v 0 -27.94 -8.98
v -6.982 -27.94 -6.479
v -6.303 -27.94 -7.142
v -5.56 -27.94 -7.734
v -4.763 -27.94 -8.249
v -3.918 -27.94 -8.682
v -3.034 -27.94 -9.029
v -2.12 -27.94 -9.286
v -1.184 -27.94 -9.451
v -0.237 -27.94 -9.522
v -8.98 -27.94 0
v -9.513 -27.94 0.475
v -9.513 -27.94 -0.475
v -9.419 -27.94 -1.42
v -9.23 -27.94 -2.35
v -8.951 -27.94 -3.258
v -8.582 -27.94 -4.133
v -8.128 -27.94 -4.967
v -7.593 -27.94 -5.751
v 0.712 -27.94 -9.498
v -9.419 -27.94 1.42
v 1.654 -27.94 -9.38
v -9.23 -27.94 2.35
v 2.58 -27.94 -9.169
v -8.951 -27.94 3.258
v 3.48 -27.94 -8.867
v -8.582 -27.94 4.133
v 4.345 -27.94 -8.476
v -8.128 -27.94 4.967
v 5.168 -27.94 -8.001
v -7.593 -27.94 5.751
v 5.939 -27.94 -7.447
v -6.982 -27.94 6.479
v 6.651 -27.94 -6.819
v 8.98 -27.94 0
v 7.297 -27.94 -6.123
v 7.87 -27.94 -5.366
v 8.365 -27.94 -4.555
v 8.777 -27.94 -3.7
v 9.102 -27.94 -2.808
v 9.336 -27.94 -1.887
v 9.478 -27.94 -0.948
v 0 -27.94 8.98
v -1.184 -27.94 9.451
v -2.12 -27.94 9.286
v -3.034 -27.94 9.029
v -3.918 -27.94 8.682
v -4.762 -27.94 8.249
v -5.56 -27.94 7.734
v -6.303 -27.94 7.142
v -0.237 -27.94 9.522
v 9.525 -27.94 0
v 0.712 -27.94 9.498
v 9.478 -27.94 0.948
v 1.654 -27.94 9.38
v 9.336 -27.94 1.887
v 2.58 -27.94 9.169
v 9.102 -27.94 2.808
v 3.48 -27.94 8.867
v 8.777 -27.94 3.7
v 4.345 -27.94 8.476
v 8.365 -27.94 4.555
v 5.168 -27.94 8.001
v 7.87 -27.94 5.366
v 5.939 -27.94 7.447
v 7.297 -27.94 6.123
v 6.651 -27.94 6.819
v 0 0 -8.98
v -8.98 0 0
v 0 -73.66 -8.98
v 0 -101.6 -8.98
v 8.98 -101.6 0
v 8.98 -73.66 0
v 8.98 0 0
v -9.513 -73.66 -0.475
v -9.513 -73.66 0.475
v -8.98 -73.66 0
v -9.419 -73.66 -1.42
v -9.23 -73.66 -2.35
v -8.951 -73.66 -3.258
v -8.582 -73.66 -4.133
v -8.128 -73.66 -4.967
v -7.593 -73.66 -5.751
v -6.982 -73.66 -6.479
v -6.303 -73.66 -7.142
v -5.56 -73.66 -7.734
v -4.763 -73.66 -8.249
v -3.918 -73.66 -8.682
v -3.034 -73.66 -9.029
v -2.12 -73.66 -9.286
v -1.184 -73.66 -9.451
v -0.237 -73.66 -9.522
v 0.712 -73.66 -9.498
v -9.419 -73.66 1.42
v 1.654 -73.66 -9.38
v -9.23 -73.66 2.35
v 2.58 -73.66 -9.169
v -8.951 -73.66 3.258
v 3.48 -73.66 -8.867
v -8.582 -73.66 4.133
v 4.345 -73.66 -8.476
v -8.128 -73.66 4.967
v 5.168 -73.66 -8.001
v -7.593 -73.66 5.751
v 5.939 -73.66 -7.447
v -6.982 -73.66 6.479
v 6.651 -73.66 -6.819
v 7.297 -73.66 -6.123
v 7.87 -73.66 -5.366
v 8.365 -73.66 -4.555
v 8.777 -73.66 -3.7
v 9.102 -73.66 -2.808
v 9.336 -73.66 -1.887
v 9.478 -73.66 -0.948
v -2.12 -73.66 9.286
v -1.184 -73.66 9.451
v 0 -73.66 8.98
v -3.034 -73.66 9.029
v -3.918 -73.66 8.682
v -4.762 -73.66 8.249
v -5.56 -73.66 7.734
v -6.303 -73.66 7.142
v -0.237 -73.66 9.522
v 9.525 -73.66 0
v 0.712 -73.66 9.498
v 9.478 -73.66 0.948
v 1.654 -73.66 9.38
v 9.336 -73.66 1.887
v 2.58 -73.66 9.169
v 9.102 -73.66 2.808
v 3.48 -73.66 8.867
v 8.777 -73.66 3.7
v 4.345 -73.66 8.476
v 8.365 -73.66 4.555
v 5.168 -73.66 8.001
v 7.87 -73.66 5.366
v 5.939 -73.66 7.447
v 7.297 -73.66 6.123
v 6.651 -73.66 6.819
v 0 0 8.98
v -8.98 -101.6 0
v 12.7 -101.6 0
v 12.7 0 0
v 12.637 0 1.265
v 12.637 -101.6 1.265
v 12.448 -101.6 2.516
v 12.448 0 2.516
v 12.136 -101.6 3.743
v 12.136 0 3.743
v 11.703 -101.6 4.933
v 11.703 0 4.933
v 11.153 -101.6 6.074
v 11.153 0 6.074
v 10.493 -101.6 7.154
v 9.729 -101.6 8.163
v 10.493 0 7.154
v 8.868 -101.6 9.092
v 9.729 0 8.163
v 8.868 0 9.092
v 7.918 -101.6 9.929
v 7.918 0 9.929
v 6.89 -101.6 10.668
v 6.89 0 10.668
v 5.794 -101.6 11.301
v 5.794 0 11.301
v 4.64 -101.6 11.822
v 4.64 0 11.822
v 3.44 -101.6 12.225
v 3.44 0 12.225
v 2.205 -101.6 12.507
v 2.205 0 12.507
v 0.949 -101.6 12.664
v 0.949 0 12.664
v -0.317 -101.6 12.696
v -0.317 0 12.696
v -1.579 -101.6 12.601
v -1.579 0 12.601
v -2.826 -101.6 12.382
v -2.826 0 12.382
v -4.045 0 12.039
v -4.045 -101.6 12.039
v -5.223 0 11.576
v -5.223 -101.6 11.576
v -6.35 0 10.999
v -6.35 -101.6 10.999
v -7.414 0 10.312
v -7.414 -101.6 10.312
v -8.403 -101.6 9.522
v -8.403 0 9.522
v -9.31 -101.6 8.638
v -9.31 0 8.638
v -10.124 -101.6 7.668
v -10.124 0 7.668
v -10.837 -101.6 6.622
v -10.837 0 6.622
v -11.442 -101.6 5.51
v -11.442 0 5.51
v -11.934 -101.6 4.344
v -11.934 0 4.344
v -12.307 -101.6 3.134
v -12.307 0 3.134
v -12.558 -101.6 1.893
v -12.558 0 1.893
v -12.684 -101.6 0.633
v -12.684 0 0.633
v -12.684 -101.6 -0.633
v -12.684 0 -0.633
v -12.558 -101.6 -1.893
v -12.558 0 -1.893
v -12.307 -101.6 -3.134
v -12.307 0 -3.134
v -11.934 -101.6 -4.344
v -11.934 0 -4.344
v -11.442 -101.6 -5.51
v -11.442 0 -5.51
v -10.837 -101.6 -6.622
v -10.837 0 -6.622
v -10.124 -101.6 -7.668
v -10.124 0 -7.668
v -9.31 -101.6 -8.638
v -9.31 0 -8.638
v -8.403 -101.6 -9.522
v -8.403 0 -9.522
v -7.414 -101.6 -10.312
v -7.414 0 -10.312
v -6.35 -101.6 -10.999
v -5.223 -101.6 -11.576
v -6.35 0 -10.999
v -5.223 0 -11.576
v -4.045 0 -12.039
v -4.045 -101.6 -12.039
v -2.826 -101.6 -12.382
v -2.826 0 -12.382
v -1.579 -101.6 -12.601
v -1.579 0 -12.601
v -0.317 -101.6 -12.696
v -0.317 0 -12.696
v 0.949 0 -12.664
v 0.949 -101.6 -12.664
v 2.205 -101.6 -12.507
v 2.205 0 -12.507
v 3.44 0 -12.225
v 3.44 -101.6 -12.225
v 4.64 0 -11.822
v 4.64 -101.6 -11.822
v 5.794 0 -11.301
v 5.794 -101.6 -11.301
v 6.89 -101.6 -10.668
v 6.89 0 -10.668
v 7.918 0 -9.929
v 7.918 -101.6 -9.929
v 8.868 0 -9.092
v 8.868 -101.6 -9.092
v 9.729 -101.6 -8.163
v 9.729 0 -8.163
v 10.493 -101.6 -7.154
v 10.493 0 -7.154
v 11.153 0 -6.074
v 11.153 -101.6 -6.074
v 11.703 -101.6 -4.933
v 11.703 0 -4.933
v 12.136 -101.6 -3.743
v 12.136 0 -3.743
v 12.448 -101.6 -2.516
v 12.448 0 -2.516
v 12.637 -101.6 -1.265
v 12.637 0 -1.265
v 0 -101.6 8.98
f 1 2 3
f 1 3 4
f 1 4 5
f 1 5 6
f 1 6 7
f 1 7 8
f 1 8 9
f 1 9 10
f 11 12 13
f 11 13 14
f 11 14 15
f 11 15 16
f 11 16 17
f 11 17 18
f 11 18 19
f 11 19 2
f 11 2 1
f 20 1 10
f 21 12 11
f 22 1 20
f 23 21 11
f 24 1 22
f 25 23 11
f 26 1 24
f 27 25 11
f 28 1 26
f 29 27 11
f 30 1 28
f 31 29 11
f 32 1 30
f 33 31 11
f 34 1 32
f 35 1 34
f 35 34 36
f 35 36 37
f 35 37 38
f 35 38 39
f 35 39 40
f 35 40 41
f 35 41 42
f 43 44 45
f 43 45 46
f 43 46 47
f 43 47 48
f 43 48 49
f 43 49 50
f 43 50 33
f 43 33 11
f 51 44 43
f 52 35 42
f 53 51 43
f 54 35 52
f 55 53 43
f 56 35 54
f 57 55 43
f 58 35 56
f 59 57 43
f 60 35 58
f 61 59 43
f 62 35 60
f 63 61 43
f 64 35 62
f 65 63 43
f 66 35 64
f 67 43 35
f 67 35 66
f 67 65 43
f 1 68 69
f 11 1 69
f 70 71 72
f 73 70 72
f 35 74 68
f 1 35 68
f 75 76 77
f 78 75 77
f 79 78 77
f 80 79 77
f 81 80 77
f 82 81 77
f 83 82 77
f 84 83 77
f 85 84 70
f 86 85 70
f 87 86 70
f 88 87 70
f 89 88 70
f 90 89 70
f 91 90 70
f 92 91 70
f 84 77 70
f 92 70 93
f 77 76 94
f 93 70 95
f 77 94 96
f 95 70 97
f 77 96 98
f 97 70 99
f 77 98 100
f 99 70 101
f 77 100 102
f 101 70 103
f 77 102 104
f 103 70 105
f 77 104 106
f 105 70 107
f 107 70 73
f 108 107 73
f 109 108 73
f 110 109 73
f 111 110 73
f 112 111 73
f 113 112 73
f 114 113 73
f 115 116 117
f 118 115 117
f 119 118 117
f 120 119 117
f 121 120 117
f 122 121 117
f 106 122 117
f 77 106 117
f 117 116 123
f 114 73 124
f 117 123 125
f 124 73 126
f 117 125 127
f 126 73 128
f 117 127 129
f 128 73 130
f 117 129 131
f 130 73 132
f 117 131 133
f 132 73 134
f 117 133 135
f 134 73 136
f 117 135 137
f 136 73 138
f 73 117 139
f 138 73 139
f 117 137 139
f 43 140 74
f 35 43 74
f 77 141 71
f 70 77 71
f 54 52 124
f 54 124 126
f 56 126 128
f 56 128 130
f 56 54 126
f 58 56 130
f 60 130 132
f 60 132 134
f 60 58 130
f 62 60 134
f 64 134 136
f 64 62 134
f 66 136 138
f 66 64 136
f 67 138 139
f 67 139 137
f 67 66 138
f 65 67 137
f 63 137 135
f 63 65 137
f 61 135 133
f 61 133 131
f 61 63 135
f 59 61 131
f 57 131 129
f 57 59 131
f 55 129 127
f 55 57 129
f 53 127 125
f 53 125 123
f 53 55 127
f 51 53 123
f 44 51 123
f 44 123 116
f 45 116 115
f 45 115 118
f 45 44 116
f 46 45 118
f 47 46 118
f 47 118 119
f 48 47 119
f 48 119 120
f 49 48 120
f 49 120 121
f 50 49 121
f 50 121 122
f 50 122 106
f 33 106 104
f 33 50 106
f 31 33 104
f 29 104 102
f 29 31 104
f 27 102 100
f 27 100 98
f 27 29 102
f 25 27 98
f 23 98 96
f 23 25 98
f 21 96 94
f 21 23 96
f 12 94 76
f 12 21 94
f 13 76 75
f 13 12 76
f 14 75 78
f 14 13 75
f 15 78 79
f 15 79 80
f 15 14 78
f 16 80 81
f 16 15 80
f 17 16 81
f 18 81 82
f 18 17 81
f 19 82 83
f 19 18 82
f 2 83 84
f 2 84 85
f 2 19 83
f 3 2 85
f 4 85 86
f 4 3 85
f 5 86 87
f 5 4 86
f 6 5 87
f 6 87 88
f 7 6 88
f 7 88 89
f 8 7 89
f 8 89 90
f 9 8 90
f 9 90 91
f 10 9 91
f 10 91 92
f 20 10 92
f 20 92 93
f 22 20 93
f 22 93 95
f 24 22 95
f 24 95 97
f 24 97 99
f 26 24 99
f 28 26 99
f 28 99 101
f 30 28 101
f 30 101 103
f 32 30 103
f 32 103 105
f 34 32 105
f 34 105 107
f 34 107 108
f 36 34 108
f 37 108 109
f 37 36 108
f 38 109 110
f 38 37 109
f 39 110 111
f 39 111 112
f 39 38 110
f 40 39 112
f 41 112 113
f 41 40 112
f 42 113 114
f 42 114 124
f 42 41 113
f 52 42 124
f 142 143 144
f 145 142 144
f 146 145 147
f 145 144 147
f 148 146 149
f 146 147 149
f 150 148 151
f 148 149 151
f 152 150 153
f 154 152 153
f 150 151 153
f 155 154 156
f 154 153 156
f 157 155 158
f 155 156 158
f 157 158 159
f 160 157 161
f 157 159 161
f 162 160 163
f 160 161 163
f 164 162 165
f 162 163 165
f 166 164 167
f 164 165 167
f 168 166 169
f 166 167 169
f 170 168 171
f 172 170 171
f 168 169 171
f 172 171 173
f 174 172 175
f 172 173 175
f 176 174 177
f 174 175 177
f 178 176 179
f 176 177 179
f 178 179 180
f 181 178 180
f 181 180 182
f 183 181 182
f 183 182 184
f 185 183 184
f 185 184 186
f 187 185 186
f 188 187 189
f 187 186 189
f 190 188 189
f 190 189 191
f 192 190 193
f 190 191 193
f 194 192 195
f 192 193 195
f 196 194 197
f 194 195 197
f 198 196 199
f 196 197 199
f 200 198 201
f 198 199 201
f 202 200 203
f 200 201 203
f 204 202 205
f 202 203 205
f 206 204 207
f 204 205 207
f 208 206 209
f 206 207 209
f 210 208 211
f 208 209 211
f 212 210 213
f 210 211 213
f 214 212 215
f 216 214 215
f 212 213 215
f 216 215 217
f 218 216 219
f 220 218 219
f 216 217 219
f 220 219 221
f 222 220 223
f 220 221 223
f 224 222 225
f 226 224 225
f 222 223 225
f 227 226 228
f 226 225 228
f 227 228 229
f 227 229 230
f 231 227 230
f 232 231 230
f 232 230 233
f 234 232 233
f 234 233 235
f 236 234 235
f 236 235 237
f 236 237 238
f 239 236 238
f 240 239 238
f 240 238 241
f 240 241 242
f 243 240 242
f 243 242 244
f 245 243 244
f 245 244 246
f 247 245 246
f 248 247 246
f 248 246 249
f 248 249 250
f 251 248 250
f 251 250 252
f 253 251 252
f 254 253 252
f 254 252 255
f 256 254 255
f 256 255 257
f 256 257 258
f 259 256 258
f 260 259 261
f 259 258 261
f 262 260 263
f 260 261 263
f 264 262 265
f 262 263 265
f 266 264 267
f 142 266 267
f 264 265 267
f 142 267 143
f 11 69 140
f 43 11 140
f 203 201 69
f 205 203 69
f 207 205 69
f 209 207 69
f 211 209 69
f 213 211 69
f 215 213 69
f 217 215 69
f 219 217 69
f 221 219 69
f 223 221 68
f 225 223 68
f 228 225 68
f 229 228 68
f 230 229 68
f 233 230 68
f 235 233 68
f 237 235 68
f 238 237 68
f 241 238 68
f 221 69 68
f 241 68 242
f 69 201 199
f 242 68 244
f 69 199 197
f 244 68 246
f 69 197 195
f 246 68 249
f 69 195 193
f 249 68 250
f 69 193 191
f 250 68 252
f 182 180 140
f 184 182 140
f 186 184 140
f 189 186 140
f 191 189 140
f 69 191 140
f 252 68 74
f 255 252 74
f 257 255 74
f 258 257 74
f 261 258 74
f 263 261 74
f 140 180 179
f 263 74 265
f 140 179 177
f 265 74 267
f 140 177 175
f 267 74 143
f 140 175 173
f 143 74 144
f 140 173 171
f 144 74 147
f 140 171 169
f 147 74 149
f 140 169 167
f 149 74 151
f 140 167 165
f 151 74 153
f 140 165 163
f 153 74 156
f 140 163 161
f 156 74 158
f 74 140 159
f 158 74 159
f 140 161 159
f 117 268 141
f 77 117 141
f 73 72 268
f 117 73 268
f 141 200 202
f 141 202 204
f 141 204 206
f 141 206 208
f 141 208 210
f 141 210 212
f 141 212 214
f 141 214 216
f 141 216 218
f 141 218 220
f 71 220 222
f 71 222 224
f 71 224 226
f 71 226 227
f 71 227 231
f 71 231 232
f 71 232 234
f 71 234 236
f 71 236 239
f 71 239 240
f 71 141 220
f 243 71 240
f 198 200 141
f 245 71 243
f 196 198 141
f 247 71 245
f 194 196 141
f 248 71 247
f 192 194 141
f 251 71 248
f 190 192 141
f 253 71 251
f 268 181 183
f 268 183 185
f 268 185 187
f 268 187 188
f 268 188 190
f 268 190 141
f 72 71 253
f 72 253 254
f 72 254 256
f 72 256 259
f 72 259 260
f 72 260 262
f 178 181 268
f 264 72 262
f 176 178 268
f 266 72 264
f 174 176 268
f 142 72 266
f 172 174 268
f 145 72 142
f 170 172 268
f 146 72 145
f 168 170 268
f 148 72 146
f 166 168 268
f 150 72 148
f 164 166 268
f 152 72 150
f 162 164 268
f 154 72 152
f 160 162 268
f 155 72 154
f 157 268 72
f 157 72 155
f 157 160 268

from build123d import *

# Parameters (mm, degrees)
F0_R     = 12.7
F1_DEPTH = 101.6
F3_DEPTH = 27.94
F5_DEPTH = 27.94
F7_R     = 9.525
F8_DEPTH = 45.72


with BuildPart() as f1:
    # F0 (on Front) → F1 (new body)
    with BuildSketch(Plane.XZ):
        Circle(F0_R)
    extrude(amount=F1_DEPTH)

    # F2 (on face) → F3 (cut)
    with BuildSketch(Plane.XZ.offset(101.6)):
        Polygon((0, -8.980256), (8.980256, 0), (0, 8.980256), (-8.980256, 0), align=None)
    extrude(amount=-F3_DEPTH, mode=Mode.SUBTRACT)

    # F4 (on face) → F5 (cut)
    with BuildSketch(Plane(origin=(0, 0, 0), x_dir=(-1, 0, 0), z_dir=(0, 1, 0))):
        Polygon((0, -8.980256), (8.980256, 0), (0, 8.980256), (-8.980256, 0), align=None)
    extrude(amount=-F5_DEPTH, mode=Mode.SUBTRACT)

    # F7 (on offset) → F8 (cut)
    with BuildSketch(Plane.XZ.offset(27.94)):
        Circle(F7_R)
    extrude(amount=F8_DEPTH, mode=Mode.SUBTRACT)


solid = f1.part
